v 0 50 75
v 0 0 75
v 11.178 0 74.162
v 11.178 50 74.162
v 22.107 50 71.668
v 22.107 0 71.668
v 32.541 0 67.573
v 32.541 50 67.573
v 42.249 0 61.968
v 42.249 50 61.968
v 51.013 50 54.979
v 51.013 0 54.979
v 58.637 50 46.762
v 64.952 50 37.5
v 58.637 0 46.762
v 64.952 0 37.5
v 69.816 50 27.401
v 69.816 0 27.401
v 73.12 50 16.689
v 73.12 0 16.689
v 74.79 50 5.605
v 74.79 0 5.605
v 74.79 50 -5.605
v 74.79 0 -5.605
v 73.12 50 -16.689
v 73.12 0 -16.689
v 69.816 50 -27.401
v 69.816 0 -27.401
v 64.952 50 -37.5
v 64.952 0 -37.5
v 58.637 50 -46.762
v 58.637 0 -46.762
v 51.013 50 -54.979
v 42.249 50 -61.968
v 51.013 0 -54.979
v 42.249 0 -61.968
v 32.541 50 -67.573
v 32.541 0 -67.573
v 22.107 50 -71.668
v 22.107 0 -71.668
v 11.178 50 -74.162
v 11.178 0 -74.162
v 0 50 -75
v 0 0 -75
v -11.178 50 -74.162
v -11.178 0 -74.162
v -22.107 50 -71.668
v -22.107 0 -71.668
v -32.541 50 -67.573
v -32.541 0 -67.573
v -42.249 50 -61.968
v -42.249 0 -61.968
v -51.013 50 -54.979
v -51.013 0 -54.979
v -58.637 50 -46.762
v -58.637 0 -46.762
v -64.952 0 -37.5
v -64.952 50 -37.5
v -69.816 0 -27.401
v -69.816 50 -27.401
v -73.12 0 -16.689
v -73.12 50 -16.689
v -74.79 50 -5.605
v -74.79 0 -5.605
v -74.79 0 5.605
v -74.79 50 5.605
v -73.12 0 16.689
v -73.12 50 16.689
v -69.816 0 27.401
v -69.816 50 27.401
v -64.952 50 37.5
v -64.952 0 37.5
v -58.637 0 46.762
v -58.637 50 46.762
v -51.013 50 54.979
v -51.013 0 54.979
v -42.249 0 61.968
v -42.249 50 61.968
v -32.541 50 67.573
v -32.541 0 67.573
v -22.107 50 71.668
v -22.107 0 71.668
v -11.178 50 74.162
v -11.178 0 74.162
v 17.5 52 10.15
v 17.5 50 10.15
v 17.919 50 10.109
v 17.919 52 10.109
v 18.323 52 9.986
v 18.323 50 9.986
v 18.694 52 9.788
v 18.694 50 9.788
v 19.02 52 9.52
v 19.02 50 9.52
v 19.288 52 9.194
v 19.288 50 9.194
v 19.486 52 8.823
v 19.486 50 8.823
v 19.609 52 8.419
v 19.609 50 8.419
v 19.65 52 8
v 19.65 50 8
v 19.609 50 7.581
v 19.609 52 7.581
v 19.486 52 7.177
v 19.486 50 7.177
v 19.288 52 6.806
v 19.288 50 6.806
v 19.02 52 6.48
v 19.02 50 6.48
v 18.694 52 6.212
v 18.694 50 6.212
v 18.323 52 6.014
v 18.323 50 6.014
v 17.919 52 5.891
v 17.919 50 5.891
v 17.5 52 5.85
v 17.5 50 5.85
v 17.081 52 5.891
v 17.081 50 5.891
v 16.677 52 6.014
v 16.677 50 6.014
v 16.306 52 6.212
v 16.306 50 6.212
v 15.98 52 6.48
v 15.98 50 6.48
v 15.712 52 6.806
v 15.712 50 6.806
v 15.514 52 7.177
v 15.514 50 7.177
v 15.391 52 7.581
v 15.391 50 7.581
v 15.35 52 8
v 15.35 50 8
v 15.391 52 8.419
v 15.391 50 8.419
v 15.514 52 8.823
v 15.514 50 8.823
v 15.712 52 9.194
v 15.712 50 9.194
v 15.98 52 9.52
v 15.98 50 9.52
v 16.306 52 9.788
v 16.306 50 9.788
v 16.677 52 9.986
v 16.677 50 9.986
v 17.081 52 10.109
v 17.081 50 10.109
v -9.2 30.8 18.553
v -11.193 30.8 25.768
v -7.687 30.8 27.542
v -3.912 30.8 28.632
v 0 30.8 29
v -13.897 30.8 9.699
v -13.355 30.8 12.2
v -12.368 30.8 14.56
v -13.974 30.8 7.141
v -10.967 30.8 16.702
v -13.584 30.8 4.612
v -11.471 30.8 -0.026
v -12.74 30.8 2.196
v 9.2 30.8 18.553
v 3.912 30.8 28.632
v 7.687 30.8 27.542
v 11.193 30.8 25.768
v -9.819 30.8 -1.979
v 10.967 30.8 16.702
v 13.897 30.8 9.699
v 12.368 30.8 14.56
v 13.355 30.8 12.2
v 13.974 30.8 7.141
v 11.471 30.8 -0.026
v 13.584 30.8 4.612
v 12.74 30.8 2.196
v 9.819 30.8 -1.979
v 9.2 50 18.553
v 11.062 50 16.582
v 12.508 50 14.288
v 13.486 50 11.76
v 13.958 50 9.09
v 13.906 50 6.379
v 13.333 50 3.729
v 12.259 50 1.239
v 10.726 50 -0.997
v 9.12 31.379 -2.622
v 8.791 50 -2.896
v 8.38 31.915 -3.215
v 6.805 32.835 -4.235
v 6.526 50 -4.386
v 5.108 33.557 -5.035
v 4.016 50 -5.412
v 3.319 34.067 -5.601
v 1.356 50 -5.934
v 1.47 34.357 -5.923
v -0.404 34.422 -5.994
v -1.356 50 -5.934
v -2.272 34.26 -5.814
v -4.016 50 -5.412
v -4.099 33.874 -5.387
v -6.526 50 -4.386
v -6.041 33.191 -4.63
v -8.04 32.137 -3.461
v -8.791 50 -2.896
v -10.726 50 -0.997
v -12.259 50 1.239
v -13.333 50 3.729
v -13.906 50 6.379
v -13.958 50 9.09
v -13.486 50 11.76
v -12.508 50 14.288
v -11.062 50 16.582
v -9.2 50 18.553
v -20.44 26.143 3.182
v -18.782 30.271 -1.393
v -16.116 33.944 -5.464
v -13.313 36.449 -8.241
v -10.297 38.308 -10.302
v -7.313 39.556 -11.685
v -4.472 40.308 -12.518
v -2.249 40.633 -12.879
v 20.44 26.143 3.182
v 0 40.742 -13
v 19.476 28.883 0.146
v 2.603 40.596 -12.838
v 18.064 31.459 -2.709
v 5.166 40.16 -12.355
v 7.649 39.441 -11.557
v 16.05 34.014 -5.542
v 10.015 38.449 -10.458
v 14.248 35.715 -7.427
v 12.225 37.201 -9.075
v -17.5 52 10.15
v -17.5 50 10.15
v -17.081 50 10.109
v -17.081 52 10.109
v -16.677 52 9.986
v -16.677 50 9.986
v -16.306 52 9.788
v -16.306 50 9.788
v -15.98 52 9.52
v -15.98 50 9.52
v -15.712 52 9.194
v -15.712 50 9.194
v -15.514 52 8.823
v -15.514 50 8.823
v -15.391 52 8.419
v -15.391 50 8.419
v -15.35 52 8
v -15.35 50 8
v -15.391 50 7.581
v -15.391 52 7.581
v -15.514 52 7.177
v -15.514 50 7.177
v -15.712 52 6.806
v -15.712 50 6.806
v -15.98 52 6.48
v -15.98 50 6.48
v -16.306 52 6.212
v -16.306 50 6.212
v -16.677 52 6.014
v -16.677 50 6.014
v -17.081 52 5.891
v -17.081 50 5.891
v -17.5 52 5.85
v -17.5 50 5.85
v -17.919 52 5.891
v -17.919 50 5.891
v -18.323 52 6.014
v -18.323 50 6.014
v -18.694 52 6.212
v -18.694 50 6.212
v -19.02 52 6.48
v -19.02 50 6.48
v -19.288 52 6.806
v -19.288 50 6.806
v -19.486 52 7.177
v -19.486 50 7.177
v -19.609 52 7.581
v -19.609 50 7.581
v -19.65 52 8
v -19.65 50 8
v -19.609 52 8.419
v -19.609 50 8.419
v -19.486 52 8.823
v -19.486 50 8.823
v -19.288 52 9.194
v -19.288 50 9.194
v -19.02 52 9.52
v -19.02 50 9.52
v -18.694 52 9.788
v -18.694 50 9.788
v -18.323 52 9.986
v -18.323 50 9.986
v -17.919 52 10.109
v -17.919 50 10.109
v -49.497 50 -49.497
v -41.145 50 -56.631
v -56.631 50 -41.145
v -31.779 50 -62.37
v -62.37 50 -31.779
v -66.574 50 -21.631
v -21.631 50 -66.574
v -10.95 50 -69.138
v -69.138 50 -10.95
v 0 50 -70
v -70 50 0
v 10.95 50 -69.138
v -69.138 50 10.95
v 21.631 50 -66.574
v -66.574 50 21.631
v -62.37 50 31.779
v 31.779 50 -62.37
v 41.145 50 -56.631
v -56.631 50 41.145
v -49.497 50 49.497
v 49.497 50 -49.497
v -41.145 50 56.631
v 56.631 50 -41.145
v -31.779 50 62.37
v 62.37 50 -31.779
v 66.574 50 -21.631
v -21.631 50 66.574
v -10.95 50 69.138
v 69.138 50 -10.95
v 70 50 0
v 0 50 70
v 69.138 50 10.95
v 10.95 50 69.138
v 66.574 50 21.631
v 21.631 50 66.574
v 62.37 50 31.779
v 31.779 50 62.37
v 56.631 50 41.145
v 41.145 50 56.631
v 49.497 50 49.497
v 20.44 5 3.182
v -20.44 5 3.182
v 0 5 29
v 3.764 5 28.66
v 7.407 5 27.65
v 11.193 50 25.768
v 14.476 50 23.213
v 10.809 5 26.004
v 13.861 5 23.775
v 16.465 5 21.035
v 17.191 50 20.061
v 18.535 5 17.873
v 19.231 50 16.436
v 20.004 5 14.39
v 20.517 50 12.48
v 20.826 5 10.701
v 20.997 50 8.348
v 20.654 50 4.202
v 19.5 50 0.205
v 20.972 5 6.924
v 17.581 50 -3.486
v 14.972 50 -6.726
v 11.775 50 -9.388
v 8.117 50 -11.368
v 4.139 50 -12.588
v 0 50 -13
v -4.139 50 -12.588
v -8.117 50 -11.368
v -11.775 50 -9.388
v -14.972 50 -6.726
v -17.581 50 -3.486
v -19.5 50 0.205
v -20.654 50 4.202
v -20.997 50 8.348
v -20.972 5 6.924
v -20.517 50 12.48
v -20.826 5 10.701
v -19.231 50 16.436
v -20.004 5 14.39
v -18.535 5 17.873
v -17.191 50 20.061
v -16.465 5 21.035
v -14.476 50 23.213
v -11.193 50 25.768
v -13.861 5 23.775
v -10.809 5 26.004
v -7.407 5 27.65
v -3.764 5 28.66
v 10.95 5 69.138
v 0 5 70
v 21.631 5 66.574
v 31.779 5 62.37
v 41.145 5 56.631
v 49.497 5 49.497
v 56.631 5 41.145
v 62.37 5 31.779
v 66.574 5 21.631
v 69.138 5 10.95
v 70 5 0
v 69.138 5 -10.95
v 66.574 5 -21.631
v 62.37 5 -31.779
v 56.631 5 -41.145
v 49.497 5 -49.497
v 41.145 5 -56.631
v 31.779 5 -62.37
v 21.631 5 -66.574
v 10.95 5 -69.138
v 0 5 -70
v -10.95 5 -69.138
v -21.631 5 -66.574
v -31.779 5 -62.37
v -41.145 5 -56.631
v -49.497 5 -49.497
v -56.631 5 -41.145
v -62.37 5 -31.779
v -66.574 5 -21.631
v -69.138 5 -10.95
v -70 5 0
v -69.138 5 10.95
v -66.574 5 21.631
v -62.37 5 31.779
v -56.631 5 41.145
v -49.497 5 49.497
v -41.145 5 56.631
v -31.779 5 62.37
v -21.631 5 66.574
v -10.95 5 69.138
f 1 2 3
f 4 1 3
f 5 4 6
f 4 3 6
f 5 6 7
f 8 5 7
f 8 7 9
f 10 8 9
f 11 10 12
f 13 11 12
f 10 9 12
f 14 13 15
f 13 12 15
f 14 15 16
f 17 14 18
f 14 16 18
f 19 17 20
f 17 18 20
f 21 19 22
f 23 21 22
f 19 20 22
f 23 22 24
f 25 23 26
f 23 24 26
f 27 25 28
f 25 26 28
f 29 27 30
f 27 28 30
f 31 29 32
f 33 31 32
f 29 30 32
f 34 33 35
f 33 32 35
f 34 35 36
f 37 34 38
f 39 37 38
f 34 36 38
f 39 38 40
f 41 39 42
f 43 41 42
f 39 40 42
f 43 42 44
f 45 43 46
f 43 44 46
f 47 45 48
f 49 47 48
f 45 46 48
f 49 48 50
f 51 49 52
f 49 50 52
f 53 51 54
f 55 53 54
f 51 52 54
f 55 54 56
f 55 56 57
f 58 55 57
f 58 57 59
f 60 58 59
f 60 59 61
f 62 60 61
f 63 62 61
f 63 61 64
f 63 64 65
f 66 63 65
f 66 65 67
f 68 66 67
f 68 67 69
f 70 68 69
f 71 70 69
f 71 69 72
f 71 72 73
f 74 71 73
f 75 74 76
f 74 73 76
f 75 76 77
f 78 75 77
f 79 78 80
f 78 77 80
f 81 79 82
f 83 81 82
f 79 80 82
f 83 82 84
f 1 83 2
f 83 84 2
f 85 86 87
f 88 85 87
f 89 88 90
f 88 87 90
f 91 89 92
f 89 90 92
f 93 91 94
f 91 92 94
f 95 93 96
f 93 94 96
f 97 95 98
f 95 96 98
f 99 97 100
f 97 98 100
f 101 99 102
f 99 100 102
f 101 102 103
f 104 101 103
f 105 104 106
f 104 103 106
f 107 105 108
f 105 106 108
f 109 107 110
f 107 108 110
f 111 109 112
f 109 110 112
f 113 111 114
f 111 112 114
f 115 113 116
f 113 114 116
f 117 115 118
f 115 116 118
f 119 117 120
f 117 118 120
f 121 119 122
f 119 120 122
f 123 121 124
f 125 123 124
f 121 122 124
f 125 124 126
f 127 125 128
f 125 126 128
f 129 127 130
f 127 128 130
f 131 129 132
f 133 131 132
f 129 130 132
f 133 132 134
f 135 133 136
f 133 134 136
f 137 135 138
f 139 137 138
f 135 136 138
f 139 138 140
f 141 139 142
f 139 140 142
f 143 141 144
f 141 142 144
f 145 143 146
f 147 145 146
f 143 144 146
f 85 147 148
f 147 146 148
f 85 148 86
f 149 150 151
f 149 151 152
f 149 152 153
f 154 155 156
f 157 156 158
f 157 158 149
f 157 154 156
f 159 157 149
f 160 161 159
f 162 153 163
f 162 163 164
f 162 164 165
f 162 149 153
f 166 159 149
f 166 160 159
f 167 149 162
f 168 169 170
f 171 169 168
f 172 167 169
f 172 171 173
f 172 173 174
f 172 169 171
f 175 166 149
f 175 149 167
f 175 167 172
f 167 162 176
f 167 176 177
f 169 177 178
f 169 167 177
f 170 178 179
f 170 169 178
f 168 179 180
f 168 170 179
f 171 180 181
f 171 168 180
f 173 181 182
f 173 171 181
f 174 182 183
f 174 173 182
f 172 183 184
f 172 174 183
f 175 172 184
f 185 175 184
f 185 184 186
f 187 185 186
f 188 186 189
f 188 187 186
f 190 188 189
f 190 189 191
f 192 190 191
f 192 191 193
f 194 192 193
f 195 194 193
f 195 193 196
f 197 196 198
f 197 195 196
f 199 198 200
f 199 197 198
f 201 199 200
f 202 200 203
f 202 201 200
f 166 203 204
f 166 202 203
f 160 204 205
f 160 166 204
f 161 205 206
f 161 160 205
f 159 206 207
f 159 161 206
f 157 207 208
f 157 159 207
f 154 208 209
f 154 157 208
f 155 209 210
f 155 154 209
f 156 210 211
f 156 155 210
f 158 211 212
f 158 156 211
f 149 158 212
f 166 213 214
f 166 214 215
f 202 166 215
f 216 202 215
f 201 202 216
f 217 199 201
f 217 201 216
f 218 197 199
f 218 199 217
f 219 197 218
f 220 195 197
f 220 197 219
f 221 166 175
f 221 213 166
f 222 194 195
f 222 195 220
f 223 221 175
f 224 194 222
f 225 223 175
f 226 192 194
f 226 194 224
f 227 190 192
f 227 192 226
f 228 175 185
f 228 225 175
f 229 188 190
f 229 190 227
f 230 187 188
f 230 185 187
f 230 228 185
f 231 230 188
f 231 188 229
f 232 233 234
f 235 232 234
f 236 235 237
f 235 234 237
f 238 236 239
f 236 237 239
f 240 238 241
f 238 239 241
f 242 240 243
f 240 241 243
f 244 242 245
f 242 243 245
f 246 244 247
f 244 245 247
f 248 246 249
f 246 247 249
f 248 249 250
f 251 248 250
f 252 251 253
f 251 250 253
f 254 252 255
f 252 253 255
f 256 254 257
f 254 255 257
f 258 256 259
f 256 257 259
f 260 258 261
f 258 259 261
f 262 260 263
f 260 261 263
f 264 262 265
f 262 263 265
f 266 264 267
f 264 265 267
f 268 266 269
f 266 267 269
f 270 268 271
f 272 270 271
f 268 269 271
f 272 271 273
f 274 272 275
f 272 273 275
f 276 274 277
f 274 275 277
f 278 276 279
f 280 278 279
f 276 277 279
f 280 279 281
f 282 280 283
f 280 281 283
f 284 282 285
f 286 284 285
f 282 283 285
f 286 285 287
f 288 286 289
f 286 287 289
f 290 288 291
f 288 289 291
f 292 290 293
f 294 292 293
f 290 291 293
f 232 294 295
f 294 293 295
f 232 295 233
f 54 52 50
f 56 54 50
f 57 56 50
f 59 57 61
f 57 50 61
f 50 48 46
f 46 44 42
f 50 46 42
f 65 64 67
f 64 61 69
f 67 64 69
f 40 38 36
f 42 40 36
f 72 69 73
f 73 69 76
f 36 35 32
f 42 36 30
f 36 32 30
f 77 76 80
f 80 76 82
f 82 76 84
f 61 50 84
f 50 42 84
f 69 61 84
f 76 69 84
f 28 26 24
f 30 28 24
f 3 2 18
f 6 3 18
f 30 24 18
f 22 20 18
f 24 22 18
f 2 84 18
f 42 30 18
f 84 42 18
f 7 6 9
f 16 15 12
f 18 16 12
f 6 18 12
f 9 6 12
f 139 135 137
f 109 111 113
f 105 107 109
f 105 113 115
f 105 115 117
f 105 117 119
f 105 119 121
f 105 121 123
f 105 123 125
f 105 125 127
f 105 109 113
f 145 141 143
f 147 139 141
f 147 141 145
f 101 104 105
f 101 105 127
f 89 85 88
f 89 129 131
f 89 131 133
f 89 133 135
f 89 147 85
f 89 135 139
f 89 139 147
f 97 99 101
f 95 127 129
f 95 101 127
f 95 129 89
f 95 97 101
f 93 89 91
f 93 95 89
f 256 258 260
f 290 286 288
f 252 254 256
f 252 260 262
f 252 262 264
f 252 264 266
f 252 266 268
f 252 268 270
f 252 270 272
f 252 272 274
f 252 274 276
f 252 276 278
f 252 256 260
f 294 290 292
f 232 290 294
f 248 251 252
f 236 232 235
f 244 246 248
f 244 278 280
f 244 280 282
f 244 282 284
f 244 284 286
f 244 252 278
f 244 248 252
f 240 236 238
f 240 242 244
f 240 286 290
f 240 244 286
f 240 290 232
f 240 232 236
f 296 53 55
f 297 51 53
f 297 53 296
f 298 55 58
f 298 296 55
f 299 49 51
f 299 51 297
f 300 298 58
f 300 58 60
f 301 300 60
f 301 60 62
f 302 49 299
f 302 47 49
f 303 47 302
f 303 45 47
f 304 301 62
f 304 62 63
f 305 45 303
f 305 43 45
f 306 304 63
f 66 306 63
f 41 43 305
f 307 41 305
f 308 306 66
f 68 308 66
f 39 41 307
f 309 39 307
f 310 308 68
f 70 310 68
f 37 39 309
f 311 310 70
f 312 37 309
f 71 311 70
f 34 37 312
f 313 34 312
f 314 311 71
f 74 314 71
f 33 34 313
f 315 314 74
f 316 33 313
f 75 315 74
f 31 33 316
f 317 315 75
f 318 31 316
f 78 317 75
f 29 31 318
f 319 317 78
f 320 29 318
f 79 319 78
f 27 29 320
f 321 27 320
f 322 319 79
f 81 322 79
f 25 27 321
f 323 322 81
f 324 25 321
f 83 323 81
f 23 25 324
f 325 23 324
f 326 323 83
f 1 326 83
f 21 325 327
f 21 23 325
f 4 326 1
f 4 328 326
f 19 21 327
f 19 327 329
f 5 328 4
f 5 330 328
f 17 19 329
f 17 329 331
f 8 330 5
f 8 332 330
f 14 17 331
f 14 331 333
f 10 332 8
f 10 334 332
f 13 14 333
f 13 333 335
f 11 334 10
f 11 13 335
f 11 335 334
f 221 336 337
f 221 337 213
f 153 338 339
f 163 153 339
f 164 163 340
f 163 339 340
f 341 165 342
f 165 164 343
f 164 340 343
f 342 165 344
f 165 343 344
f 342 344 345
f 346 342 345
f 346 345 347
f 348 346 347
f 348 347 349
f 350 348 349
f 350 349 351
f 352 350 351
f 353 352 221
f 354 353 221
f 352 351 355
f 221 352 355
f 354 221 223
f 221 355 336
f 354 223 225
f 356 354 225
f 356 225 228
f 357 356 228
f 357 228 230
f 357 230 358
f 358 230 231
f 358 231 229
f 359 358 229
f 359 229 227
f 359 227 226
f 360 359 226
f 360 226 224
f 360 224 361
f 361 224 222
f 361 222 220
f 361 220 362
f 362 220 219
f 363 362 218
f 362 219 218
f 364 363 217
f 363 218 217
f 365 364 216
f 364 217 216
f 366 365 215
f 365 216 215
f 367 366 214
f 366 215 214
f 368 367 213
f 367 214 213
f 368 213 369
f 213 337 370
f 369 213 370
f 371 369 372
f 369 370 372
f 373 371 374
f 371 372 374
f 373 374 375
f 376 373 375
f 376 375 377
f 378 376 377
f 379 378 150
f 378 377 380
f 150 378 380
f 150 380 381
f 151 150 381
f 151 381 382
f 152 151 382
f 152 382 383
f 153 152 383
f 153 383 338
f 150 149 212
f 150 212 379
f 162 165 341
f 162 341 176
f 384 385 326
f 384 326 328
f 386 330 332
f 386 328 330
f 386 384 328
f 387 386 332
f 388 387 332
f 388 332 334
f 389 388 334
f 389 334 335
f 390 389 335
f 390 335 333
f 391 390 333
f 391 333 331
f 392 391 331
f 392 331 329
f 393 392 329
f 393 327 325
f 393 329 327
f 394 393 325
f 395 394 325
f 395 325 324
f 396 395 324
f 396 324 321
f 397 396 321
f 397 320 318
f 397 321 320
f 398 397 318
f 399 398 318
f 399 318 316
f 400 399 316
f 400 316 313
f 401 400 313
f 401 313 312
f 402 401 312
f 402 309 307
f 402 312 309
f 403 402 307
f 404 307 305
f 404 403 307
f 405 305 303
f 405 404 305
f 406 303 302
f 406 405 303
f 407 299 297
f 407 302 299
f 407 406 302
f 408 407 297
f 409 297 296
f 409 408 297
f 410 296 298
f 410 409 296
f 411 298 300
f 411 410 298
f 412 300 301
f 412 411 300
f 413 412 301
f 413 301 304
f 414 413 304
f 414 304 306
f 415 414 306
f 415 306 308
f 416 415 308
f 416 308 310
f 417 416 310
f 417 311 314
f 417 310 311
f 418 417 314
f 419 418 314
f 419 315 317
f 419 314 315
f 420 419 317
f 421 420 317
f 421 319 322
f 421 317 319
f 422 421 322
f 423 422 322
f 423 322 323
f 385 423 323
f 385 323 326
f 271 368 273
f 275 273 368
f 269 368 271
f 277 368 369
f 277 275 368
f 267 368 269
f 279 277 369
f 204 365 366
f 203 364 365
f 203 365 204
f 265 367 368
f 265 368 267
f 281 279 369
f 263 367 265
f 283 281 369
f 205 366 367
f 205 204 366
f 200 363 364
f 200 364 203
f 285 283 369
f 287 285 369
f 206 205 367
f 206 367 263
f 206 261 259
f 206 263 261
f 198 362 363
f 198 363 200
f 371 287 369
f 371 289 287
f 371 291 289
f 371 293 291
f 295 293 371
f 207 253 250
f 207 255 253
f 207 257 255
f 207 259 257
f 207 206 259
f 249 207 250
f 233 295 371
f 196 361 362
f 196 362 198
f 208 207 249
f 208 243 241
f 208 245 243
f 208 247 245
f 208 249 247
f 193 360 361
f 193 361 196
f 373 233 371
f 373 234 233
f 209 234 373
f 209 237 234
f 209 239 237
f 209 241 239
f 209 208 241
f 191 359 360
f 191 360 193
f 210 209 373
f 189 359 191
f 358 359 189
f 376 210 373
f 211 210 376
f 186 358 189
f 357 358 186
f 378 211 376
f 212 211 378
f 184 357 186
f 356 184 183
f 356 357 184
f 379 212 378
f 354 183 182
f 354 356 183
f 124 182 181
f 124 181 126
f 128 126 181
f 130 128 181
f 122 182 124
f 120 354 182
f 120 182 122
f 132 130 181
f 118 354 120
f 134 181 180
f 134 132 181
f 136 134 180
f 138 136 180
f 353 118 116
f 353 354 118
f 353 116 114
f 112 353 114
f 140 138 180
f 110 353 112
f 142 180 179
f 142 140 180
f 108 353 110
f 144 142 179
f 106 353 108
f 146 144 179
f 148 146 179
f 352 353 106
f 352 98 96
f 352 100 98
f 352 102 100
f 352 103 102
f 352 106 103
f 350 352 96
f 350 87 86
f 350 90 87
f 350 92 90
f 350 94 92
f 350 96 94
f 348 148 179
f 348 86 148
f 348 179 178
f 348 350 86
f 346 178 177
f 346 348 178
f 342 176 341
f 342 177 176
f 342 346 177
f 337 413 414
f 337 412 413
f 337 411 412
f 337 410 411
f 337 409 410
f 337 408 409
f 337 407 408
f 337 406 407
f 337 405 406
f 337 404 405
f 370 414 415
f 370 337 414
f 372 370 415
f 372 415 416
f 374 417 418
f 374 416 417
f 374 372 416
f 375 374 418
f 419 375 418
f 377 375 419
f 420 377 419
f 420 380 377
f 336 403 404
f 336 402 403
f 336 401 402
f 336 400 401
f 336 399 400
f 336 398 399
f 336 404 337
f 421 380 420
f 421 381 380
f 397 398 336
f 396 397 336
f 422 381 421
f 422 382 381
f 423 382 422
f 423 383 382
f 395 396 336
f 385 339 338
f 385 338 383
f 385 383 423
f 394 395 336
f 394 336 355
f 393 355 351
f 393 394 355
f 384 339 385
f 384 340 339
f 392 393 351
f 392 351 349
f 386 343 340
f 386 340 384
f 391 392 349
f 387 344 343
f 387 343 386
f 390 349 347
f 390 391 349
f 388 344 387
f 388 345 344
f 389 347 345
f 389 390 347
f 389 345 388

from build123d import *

# Parameters (mm, degrees)
SKETCH1_R               = 75
BOSS_EXTRUDE1_DEPTH     = 50
SHELL1_T                = -5
SKETCH2_R               = 21
BOSS_EXTRUDE2_DEPTH     = 45
CUT_EXTRUDE1_START      = -19.2
CUT_EXTRUDE1_DEPTH      = 19.2
SKETCH3_3_R             = 2.15
BOSS_EXTRUDE3_DEPTH     = 2
CUT_EXTRUDE3_DEPTH      = 32
CUT_EXTRUDE3_DEPTH_BACK = 27


with BuildPart() as part:
    # Sketch1 → Boss-Extrude1 (new body)
    with BuildSketch(Plane(origin=(0, 0, 0), x_dir=(1, 0, 0), z_dir=(0, 1, 0))):
        with Locations(Location((0, 0, 0), (0, 0, 270))):
            Circle(SKETCH1_R)
    extrude(amount=BOSS_EXTRUDE1_DEPTH)

    # Shell1
    shell1_openings = [part.faces().sort_by_distance(p)[0] for p in [
        (0, 50, 0),
    ]]
    offset(amount=SHELL1_T, openings=shell1_openings, kind=Kind.INTERSECTION)

    # Sketch2 → Boss-Extrude2 (add)
    with BuildSketch(Plane(origin=(0, 5, 0), x_dir=(1, 0, 0), z_dir=(0, 1, 0))):
        with Locations(Location((0, -8, 0), (0, 0, 270))):
            Circle(SKETCH2_R)
    extrude(amount=BOSS_EXTRUDE2_DEPTH)

    # Sketch3 → Cut-Extrude1 (cut)
    with BuildSketch(Plane(origin=(0, 50, 0), x_dir=(1, 0, 0), z_dir=(0, 1, 0)).offset(CUT_EXTRUDE1_START)):
        with BuildLine():
            Line((11.193269132, -25.768250508), (9.2, -18.552724767))
            ThreePointArc((9.2, -18.552724767), (0, 6), (-9.2, -18.552724767))
            Line((-9.2, -18.552724767), (-11.193269132, -25.768250508))
            ThreePointArc((-11.193269132, -25.768250508), (0, -29), (11.193269132, -25.768250508))
        make_face()
    extrude(amount=CUT_EXTRUDE1_DEPTH, mode=Mode.SUBTRACT)

    # Sketch3<3> → Boss-Extrude3 (add)
    with BuildSketch(Plane(origin=(0, 50, 0), x_dir=(1, 0, 0), z_dir=(0, 1, 0))):
        with Locations(Location((-17.5, -8, 0), (0, 0, 270))):
            Circle(SKETCH3_3_R)
        with Locations(Location((17.5, -8, 0), (0, 0, 270))):
            Circle(SKETCH3_3_R)
    extrude(amount=BOSS_EXTRUDE3_DEPTH)

    # Sketch6 → Cut-Extrude3 (cut, two sides: drawn at the far end of the back side and taken through both)
    with BuildSketch(Plane(origin=(0, 50, -13), x_dir=(0, 0, 1), z_dir=(-1, 0, 0)).offset(-CUT_EXTRUDE3_DEPTH_BACK)):
        Polygon((-3.408673703, -45), (16.182064941, -45), (16.182064941, -23.856535334), (0, -9.257667594), (-3.408673703, -9.257667594), align=None)
    extrude(amount=CUT_EXTRUDE3_DEPTH + CUT_EXTRUDE3_DEPTH_BACK, mode=Mode.SUBTRACT)


solid = part.part
